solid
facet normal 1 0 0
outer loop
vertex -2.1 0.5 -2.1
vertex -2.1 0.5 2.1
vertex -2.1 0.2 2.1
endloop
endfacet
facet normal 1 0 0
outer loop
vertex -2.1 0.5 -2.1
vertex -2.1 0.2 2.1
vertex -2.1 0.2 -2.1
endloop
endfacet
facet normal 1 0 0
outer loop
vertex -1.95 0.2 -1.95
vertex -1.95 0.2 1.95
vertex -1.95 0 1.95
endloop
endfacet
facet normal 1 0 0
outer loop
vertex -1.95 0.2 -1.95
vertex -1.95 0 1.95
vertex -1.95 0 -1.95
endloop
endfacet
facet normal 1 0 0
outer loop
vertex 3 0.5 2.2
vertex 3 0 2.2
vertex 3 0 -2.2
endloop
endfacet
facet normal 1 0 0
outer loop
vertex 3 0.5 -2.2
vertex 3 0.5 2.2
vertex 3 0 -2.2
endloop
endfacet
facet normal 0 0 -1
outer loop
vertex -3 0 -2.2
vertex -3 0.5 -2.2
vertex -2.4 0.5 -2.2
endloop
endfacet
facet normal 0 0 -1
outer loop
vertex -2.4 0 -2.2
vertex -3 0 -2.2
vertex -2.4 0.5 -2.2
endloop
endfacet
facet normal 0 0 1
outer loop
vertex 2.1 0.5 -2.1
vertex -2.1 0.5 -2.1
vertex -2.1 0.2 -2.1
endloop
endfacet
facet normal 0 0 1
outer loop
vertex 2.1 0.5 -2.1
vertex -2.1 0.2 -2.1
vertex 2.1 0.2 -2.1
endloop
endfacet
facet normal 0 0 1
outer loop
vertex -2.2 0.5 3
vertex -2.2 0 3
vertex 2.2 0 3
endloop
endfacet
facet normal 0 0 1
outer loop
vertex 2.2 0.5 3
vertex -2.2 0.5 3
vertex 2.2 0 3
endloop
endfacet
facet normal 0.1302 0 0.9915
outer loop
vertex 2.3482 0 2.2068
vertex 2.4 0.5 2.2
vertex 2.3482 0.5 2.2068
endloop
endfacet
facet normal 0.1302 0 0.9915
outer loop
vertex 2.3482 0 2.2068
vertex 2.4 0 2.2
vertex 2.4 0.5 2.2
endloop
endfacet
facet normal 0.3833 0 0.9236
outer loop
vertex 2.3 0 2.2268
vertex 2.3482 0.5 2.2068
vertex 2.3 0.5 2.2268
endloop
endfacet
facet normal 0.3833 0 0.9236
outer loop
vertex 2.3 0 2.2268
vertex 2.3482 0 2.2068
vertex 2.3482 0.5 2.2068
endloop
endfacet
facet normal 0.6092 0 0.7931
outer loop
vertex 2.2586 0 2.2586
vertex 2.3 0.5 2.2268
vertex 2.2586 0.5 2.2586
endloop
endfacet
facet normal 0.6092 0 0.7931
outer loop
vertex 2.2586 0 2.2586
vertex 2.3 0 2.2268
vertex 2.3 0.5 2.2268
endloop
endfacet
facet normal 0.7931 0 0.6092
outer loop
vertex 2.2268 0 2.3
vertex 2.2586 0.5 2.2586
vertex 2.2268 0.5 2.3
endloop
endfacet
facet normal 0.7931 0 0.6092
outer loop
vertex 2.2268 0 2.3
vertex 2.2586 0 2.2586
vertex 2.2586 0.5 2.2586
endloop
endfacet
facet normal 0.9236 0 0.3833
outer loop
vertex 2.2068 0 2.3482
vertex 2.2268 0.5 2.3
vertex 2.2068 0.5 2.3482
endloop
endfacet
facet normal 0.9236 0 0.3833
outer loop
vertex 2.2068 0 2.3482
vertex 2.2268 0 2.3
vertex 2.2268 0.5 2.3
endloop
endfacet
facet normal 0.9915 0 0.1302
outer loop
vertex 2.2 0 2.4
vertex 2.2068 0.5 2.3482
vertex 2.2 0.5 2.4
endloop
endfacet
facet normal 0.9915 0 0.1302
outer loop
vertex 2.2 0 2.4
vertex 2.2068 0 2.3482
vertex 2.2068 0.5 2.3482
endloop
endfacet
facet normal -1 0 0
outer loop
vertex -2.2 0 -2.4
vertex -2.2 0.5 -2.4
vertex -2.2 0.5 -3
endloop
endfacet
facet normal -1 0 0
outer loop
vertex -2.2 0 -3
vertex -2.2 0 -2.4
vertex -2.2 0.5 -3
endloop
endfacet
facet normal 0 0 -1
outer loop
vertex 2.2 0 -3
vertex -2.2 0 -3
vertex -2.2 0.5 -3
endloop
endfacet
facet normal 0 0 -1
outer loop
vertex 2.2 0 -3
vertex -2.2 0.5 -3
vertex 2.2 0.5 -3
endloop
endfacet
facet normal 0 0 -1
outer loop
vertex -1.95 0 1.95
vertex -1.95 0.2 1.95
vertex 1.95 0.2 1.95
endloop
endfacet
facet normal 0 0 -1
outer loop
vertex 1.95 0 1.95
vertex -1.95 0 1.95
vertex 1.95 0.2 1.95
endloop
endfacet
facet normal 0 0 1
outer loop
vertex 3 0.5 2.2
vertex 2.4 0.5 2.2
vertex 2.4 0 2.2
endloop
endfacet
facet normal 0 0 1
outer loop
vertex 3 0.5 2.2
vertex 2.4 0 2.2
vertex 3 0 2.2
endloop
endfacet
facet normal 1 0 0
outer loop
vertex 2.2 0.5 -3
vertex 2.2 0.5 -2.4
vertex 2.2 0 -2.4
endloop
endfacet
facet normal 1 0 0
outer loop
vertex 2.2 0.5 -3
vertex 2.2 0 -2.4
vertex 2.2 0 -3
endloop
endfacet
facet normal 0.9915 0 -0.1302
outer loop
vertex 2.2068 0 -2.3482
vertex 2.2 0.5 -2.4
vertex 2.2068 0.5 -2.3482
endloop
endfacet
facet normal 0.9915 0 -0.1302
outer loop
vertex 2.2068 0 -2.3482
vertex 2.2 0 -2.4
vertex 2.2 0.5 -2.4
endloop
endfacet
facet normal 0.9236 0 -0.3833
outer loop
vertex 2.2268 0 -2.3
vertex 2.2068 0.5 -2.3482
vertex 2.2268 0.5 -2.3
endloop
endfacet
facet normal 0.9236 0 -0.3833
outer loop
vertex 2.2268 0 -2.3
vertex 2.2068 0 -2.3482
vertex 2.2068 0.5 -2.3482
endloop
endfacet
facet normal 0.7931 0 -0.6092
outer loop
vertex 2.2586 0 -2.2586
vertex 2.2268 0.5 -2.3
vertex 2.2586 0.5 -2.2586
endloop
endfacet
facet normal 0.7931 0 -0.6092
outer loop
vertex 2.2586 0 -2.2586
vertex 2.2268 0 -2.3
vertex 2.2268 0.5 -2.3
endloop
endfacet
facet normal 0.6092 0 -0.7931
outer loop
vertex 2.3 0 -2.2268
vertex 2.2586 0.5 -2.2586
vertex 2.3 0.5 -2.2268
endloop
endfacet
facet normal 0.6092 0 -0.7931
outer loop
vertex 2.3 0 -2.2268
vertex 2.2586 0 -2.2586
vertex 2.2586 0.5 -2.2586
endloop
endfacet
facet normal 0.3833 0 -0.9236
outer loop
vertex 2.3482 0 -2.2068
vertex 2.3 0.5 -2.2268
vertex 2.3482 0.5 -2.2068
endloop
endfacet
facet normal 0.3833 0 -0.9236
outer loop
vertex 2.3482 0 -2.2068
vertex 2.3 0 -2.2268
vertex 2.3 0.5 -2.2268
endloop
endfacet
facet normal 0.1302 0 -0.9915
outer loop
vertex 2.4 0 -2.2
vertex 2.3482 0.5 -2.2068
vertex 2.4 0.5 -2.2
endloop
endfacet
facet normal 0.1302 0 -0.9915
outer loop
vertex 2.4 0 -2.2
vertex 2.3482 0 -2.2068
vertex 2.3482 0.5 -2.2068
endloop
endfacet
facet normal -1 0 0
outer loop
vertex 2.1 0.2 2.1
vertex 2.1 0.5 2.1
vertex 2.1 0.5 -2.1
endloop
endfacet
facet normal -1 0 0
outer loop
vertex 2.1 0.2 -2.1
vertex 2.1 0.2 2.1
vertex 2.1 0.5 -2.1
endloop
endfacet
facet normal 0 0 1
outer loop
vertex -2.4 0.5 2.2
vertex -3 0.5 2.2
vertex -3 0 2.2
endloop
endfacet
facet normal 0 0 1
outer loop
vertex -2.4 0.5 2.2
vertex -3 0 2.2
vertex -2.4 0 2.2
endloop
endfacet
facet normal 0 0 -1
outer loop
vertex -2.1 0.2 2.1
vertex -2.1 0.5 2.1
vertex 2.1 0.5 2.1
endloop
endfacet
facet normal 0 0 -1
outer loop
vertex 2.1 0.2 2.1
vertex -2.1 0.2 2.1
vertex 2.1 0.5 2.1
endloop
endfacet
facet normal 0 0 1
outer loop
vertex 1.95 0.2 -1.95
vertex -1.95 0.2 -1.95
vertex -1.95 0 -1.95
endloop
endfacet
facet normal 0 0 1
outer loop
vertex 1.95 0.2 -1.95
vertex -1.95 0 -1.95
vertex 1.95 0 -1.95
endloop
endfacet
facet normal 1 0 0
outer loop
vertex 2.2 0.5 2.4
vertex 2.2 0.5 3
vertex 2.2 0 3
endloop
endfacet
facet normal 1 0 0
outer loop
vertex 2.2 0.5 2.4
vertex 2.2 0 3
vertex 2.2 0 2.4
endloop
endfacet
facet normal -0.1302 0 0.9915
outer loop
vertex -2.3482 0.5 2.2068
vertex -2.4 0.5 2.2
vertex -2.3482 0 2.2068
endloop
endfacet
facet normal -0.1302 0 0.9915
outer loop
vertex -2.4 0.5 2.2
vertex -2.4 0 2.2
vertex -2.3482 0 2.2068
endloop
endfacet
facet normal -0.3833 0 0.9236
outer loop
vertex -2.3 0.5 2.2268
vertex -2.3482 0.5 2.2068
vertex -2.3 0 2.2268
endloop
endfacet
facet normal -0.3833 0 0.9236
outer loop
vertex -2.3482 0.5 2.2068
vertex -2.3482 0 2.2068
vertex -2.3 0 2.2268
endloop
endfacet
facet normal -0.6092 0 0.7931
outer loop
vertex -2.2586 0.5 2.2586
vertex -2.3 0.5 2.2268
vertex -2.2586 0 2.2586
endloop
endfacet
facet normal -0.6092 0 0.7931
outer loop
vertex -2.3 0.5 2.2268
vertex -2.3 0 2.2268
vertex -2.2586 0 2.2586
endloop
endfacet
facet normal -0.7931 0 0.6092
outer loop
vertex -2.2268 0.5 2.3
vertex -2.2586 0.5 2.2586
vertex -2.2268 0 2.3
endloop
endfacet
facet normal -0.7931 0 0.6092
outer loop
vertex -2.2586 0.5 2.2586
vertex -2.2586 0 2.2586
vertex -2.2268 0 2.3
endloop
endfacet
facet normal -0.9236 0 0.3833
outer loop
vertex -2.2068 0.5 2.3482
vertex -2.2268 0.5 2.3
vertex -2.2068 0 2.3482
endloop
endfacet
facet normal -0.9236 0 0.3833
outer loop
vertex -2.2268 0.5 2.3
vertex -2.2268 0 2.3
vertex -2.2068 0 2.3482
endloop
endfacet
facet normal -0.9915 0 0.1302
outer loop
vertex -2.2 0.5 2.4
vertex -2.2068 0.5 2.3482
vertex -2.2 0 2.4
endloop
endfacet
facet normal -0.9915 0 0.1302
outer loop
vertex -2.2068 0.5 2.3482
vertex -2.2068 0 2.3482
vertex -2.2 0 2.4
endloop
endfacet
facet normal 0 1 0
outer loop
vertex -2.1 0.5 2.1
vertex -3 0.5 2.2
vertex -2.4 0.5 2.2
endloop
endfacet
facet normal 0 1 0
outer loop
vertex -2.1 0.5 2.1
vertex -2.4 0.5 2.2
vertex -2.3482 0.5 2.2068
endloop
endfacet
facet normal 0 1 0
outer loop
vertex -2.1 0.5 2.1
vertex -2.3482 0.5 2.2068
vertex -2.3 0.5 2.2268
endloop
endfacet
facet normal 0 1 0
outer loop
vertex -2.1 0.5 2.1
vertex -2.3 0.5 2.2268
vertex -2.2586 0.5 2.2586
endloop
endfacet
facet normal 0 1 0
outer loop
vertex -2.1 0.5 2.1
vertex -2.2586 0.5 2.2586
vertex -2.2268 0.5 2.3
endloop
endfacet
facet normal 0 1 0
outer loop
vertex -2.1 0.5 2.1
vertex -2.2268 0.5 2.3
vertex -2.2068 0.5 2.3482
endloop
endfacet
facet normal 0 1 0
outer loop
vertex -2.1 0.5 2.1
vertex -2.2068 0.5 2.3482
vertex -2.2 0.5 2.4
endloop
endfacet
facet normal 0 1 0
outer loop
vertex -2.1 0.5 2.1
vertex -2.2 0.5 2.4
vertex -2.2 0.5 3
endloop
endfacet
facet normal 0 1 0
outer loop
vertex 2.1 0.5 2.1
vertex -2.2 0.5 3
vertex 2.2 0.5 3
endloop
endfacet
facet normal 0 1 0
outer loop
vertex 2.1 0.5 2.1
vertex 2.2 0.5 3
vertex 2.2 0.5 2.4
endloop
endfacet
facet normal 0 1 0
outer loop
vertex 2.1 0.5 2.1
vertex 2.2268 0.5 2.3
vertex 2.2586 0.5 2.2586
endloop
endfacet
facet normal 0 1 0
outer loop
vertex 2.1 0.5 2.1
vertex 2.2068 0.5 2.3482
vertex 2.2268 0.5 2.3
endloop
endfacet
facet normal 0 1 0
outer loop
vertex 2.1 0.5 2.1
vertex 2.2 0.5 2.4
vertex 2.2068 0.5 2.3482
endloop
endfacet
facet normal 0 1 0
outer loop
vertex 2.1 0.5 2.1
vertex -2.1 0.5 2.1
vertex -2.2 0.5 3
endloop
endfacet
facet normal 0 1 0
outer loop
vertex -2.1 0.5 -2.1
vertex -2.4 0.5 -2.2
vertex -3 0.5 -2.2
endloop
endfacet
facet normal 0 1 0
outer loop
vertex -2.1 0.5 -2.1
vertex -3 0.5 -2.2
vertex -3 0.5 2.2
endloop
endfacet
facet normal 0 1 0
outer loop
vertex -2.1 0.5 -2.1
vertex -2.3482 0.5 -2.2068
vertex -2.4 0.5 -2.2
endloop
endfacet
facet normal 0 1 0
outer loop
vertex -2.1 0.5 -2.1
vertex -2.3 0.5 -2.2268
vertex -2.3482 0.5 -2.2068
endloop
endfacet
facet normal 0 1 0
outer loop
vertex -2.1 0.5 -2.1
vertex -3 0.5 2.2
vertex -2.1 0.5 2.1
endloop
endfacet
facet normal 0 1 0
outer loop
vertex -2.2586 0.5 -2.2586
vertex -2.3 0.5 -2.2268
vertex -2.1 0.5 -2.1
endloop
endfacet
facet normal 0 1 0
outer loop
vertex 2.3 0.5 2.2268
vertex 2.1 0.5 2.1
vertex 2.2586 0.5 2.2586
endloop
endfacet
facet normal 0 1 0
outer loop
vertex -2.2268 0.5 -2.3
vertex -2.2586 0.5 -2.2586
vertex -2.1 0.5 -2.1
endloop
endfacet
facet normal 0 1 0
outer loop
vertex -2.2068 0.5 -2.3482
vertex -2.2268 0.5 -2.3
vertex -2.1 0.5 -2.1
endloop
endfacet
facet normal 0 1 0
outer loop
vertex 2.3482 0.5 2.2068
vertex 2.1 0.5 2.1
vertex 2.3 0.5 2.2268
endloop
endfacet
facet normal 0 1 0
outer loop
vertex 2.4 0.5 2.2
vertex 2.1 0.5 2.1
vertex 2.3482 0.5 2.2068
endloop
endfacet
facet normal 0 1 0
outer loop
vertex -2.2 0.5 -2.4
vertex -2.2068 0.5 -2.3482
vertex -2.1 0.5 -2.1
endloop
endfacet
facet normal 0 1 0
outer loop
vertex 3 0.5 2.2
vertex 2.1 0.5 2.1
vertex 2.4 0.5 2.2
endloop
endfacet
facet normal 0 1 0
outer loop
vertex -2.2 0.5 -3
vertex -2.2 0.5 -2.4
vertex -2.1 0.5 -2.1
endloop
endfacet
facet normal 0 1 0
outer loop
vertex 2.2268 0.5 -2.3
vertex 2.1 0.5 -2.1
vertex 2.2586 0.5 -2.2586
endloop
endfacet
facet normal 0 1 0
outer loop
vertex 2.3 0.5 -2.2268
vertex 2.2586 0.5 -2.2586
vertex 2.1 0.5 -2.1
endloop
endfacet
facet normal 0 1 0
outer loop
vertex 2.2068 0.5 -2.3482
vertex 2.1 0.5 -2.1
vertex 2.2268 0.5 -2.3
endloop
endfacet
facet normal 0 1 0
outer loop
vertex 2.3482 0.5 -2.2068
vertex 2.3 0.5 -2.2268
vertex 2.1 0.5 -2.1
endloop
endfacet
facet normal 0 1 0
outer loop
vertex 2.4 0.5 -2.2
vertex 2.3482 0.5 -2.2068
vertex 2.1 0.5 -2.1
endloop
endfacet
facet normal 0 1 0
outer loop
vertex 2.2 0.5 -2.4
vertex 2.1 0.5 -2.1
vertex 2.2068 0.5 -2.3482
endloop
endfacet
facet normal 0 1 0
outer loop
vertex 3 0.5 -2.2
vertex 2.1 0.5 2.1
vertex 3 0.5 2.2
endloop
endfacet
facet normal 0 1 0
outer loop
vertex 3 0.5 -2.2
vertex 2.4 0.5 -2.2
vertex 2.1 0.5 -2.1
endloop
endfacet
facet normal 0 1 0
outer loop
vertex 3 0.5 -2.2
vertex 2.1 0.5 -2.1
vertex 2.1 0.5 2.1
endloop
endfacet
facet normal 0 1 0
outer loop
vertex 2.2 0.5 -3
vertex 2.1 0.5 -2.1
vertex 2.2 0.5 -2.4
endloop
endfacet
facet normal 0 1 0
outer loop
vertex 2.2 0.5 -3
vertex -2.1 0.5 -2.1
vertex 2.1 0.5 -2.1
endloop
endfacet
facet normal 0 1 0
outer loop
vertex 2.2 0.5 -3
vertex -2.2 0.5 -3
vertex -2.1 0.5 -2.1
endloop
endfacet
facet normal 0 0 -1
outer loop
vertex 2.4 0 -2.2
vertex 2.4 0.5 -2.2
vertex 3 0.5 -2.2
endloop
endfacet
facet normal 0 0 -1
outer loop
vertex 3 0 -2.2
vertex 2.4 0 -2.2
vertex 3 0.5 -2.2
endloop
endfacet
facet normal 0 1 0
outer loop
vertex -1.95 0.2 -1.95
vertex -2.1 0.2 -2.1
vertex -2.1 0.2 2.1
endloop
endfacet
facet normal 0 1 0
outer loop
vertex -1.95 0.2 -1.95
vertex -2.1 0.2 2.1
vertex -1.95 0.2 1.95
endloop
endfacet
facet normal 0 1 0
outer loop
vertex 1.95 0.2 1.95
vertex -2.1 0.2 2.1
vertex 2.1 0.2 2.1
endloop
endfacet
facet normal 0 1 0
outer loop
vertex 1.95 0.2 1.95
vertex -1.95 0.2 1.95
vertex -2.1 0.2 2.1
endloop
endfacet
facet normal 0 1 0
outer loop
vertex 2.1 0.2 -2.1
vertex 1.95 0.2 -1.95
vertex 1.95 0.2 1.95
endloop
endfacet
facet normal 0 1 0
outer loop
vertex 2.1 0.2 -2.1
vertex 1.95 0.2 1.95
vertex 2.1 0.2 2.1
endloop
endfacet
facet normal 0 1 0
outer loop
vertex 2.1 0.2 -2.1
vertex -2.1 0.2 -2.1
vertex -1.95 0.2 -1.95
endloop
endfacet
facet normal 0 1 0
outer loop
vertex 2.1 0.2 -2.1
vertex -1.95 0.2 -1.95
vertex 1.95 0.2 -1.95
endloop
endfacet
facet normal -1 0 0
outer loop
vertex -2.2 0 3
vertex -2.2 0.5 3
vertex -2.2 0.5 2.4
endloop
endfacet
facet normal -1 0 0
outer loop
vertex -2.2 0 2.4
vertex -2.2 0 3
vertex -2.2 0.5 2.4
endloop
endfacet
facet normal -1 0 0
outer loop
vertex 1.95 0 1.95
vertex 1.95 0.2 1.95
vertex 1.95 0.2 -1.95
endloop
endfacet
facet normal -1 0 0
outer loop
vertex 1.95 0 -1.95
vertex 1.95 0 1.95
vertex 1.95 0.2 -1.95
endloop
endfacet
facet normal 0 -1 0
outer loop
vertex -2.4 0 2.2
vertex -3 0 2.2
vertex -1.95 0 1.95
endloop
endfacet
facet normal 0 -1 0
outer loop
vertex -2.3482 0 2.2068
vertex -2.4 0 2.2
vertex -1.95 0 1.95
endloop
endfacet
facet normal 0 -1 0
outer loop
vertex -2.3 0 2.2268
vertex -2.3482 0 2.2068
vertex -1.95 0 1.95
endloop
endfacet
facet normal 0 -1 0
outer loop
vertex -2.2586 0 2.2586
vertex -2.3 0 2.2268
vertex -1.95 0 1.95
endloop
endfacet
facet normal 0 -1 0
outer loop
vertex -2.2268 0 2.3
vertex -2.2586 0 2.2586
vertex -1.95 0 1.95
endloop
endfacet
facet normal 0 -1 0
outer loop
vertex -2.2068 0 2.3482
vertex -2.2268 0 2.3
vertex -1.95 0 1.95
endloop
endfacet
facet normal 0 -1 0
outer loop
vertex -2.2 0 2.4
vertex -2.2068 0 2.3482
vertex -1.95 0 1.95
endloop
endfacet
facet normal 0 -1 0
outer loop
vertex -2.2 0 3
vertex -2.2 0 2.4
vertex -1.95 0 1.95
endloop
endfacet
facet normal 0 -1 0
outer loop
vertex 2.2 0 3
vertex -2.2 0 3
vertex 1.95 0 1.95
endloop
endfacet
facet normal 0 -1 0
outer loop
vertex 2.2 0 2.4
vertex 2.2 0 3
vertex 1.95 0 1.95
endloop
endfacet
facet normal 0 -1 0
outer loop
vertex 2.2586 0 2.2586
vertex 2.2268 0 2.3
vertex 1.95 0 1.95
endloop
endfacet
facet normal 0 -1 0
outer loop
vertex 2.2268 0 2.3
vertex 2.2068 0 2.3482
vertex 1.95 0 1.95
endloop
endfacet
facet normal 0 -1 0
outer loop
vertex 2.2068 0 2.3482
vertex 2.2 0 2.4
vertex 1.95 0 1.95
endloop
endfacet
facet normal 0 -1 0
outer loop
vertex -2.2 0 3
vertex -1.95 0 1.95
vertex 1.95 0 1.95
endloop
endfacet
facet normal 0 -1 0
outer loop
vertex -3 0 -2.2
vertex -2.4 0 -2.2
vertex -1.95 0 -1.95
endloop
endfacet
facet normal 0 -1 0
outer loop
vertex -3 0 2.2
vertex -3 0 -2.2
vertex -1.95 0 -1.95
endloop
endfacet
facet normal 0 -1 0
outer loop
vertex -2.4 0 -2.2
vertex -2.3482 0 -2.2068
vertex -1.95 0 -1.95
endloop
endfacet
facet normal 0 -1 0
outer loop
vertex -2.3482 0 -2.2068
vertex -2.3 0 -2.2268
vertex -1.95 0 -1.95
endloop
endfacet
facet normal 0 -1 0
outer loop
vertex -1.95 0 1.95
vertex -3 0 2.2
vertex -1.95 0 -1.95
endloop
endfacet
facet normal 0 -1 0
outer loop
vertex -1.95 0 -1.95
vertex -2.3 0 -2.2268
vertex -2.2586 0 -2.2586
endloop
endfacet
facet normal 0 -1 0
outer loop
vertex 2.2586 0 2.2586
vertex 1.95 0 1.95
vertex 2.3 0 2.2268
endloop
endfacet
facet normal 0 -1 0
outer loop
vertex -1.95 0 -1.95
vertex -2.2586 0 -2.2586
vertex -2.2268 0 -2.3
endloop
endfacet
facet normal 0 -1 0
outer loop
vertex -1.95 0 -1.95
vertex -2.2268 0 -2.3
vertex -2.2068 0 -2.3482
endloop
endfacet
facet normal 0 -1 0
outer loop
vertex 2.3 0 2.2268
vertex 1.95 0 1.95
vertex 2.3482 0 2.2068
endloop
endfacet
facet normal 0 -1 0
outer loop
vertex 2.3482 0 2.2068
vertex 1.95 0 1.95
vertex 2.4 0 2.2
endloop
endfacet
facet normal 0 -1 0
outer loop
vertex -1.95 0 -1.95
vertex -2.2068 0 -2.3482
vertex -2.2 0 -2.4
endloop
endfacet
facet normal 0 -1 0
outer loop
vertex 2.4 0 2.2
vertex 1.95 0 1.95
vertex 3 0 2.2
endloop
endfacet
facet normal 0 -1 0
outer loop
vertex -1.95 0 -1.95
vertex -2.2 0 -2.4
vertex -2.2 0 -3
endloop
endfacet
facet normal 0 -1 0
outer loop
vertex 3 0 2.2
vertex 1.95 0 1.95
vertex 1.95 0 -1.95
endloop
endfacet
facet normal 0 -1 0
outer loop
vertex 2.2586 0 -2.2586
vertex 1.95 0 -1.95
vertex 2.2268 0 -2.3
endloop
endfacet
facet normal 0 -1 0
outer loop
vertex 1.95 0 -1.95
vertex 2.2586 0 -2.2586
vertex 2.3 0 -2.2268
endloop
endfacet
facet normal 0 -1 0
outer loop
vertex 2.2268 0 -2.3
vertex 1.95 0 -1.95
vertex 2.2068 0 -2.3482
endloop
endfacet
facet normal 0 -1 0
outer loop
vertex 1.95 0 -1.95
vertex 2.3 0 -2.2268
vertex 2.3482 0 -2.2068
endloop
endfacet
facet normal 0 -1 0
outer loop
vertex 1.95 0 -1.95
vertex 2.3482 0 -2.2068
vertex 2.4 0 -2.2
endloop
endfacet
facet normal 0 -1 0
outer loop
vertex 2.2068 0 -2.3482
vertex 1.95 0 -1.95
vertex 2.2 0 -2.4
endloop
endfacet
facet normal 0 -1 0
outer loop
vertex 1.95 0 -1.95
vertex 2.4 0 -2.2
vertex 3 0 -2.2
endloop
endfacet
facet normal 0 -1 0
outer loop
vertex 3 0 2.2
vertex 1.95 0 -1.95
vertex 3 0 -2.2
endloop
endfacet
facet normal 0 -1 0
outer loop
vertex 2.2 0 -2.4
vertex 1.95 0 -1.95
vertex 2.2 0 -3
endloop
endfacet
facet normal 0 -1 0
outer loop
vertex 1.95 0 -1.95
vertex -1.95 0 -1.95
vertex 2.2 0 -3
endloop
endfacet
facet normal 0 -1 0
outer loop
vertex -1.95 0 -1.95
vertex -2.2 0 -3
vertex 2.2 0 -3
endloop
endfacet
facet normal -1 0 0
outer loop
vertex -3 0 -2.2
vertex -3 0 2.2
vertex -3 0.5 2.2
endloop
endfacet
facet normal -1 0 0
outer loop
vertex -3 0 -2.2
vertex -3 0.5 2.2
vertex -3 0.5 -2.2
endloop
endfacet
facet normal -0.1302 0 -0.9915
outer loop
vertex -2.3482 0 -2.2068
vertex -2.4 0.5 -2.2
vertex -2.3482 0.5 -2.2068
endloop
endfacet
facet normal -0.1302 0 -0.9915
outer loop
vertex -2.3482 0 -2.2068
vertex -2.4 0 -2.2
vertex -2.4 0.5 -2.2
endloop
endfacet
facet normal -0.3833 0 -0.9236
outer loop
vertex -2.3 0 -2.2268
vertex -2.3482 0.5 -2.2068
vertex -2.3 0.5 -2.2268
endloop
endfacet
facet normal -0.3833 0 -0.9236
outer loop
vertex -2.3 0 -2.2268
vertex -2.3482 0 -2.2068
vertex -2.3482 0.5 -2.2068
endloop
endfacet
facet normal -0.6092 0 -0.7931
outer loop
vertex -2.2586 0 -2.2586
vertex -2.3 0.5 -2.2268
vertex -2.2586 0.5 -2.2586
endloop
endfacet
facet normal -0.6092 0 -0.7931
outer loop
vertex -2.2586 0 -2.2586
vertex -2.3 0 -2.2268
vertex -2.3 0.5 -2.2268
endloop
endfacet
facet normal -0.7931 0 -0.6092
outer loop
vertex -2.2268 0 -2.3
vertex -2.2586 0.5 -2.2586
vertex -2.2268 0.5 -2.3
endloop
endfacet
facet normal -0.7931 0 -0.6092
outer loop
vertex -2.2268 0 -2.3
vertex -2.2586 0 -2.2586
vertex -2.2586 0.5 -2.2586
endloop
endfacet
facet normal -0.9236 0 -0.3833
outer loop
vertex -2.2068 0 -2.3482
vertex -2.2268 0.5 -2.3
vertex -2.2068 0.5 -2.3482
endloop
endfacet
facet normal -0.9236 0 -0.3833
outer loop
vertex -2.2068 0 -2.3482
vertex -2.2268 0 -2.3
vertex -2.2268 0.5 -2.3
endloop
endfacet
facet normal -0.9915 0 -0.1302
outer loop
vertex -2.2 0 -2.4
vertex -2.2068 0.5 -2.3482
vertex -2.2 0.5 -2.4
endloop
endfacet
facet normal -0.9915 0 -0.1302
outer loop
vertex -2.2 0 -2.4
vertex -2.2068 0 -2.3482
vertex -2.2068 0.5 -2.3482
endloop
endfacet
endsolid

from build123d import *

# Parameters (mm, degrees)
SKETCH_1_W          = 6
SKETCH_1_H          = 6
EXTRUDE_1_DEPTH     = 0.5
SKETCH_2_W          = 3.9
SKETCH_2_H          = 3.9
CUT_EXTRUDE_1_DEPTH = 5.272001873
SKETCH_3_W          = 4.2
SKETCH_3_H          = 4.2
CUT_EXTRUDE_2_DEPTH = 0.3
SKETCH_4_W          = 0.8
SKETCH_4_H          = 0.8
CUT_EXTRUDE_3_DEPTH = 5.272001873
FILLET_2_R          = 0.2


with BuildPart() as part:
    # 草图1 → 凸台-拉伸1 (new body)
    with BuildSketch(Plane(origin=(0, 0, 0), x_dir=(1, 0, 0), z_dir=(0, 1, 0))):
        Rectangle(SKETCH_1_W, SKETCH_1_H)
    extrude(amount=EXTRUDE_1_DEPTH)

    # 草图2 → 切除-拉伸1 (cut, through all)
    with BuildSketch(Plane(origin=(0, 0.5, 0), x_dir=(1, 0, 0), z_dir=(0, 1, 0))):
        Rectangle(SKETCH_2_W, SKETCH_2_H)
    extrude(amount=-CUT_EXTRUDE_1_DEPTH, mode=Mode.SUBTRACT)

    # 草图3 → 切除-拉伸2 (cut)
    with BuildSketch(Plane(origin=(0, 0.5, 0), x_dir=(1, 0, 0), z_dir=(0, 1, 0))):
        Rectangle(SKETCH_3_W, SKETCH_3_H)
    extrude(amount=-CUT_EXTRUDE_2_DEPTH, mode=Mode.SUBTRACT)

    # 草图4 → 切除-拉伸3 (cut, through all)
    with BuildSketch(Plane(origin=(0, 0.5, 0), x_dir=(1, 0, 0), z_dir=(0, 1, 0))):
        with Locations((-2.6, 2.6)):
            Rectangle(SKETCH_4_W, SKETCH_4_H)
        with Locations((2.6, 2.6)):
            Rectangle(SKETCH_4_W, SKETCH_4_H)
        with Locations((-2.6, -2.6)):
            Rectangle(SKETCH_4_W, SKETCH_4_H)
        with Locations((2.6, -2.6)):
            Rectangle(SKETCH_4_W, SKETCH_4_H)
    extrude(amount=-CUT_EXTRUDE_3_DEPTH, mode=Mode.SUBTRACT)

    # 圆角2
    fillet_2_edges = [part.edges().sort_by_distance(p)[0] for p in [
        (-2.2, 0.25, -2.2),
        (2.2, 0.25, -2.2),
        (-2.2, 0.25, 2.2),
        (2.2, 0.25, 2.2),
    ]]
    fillet(fillet_2_edges, radius=FILLET_2_R)


solid = part.part
